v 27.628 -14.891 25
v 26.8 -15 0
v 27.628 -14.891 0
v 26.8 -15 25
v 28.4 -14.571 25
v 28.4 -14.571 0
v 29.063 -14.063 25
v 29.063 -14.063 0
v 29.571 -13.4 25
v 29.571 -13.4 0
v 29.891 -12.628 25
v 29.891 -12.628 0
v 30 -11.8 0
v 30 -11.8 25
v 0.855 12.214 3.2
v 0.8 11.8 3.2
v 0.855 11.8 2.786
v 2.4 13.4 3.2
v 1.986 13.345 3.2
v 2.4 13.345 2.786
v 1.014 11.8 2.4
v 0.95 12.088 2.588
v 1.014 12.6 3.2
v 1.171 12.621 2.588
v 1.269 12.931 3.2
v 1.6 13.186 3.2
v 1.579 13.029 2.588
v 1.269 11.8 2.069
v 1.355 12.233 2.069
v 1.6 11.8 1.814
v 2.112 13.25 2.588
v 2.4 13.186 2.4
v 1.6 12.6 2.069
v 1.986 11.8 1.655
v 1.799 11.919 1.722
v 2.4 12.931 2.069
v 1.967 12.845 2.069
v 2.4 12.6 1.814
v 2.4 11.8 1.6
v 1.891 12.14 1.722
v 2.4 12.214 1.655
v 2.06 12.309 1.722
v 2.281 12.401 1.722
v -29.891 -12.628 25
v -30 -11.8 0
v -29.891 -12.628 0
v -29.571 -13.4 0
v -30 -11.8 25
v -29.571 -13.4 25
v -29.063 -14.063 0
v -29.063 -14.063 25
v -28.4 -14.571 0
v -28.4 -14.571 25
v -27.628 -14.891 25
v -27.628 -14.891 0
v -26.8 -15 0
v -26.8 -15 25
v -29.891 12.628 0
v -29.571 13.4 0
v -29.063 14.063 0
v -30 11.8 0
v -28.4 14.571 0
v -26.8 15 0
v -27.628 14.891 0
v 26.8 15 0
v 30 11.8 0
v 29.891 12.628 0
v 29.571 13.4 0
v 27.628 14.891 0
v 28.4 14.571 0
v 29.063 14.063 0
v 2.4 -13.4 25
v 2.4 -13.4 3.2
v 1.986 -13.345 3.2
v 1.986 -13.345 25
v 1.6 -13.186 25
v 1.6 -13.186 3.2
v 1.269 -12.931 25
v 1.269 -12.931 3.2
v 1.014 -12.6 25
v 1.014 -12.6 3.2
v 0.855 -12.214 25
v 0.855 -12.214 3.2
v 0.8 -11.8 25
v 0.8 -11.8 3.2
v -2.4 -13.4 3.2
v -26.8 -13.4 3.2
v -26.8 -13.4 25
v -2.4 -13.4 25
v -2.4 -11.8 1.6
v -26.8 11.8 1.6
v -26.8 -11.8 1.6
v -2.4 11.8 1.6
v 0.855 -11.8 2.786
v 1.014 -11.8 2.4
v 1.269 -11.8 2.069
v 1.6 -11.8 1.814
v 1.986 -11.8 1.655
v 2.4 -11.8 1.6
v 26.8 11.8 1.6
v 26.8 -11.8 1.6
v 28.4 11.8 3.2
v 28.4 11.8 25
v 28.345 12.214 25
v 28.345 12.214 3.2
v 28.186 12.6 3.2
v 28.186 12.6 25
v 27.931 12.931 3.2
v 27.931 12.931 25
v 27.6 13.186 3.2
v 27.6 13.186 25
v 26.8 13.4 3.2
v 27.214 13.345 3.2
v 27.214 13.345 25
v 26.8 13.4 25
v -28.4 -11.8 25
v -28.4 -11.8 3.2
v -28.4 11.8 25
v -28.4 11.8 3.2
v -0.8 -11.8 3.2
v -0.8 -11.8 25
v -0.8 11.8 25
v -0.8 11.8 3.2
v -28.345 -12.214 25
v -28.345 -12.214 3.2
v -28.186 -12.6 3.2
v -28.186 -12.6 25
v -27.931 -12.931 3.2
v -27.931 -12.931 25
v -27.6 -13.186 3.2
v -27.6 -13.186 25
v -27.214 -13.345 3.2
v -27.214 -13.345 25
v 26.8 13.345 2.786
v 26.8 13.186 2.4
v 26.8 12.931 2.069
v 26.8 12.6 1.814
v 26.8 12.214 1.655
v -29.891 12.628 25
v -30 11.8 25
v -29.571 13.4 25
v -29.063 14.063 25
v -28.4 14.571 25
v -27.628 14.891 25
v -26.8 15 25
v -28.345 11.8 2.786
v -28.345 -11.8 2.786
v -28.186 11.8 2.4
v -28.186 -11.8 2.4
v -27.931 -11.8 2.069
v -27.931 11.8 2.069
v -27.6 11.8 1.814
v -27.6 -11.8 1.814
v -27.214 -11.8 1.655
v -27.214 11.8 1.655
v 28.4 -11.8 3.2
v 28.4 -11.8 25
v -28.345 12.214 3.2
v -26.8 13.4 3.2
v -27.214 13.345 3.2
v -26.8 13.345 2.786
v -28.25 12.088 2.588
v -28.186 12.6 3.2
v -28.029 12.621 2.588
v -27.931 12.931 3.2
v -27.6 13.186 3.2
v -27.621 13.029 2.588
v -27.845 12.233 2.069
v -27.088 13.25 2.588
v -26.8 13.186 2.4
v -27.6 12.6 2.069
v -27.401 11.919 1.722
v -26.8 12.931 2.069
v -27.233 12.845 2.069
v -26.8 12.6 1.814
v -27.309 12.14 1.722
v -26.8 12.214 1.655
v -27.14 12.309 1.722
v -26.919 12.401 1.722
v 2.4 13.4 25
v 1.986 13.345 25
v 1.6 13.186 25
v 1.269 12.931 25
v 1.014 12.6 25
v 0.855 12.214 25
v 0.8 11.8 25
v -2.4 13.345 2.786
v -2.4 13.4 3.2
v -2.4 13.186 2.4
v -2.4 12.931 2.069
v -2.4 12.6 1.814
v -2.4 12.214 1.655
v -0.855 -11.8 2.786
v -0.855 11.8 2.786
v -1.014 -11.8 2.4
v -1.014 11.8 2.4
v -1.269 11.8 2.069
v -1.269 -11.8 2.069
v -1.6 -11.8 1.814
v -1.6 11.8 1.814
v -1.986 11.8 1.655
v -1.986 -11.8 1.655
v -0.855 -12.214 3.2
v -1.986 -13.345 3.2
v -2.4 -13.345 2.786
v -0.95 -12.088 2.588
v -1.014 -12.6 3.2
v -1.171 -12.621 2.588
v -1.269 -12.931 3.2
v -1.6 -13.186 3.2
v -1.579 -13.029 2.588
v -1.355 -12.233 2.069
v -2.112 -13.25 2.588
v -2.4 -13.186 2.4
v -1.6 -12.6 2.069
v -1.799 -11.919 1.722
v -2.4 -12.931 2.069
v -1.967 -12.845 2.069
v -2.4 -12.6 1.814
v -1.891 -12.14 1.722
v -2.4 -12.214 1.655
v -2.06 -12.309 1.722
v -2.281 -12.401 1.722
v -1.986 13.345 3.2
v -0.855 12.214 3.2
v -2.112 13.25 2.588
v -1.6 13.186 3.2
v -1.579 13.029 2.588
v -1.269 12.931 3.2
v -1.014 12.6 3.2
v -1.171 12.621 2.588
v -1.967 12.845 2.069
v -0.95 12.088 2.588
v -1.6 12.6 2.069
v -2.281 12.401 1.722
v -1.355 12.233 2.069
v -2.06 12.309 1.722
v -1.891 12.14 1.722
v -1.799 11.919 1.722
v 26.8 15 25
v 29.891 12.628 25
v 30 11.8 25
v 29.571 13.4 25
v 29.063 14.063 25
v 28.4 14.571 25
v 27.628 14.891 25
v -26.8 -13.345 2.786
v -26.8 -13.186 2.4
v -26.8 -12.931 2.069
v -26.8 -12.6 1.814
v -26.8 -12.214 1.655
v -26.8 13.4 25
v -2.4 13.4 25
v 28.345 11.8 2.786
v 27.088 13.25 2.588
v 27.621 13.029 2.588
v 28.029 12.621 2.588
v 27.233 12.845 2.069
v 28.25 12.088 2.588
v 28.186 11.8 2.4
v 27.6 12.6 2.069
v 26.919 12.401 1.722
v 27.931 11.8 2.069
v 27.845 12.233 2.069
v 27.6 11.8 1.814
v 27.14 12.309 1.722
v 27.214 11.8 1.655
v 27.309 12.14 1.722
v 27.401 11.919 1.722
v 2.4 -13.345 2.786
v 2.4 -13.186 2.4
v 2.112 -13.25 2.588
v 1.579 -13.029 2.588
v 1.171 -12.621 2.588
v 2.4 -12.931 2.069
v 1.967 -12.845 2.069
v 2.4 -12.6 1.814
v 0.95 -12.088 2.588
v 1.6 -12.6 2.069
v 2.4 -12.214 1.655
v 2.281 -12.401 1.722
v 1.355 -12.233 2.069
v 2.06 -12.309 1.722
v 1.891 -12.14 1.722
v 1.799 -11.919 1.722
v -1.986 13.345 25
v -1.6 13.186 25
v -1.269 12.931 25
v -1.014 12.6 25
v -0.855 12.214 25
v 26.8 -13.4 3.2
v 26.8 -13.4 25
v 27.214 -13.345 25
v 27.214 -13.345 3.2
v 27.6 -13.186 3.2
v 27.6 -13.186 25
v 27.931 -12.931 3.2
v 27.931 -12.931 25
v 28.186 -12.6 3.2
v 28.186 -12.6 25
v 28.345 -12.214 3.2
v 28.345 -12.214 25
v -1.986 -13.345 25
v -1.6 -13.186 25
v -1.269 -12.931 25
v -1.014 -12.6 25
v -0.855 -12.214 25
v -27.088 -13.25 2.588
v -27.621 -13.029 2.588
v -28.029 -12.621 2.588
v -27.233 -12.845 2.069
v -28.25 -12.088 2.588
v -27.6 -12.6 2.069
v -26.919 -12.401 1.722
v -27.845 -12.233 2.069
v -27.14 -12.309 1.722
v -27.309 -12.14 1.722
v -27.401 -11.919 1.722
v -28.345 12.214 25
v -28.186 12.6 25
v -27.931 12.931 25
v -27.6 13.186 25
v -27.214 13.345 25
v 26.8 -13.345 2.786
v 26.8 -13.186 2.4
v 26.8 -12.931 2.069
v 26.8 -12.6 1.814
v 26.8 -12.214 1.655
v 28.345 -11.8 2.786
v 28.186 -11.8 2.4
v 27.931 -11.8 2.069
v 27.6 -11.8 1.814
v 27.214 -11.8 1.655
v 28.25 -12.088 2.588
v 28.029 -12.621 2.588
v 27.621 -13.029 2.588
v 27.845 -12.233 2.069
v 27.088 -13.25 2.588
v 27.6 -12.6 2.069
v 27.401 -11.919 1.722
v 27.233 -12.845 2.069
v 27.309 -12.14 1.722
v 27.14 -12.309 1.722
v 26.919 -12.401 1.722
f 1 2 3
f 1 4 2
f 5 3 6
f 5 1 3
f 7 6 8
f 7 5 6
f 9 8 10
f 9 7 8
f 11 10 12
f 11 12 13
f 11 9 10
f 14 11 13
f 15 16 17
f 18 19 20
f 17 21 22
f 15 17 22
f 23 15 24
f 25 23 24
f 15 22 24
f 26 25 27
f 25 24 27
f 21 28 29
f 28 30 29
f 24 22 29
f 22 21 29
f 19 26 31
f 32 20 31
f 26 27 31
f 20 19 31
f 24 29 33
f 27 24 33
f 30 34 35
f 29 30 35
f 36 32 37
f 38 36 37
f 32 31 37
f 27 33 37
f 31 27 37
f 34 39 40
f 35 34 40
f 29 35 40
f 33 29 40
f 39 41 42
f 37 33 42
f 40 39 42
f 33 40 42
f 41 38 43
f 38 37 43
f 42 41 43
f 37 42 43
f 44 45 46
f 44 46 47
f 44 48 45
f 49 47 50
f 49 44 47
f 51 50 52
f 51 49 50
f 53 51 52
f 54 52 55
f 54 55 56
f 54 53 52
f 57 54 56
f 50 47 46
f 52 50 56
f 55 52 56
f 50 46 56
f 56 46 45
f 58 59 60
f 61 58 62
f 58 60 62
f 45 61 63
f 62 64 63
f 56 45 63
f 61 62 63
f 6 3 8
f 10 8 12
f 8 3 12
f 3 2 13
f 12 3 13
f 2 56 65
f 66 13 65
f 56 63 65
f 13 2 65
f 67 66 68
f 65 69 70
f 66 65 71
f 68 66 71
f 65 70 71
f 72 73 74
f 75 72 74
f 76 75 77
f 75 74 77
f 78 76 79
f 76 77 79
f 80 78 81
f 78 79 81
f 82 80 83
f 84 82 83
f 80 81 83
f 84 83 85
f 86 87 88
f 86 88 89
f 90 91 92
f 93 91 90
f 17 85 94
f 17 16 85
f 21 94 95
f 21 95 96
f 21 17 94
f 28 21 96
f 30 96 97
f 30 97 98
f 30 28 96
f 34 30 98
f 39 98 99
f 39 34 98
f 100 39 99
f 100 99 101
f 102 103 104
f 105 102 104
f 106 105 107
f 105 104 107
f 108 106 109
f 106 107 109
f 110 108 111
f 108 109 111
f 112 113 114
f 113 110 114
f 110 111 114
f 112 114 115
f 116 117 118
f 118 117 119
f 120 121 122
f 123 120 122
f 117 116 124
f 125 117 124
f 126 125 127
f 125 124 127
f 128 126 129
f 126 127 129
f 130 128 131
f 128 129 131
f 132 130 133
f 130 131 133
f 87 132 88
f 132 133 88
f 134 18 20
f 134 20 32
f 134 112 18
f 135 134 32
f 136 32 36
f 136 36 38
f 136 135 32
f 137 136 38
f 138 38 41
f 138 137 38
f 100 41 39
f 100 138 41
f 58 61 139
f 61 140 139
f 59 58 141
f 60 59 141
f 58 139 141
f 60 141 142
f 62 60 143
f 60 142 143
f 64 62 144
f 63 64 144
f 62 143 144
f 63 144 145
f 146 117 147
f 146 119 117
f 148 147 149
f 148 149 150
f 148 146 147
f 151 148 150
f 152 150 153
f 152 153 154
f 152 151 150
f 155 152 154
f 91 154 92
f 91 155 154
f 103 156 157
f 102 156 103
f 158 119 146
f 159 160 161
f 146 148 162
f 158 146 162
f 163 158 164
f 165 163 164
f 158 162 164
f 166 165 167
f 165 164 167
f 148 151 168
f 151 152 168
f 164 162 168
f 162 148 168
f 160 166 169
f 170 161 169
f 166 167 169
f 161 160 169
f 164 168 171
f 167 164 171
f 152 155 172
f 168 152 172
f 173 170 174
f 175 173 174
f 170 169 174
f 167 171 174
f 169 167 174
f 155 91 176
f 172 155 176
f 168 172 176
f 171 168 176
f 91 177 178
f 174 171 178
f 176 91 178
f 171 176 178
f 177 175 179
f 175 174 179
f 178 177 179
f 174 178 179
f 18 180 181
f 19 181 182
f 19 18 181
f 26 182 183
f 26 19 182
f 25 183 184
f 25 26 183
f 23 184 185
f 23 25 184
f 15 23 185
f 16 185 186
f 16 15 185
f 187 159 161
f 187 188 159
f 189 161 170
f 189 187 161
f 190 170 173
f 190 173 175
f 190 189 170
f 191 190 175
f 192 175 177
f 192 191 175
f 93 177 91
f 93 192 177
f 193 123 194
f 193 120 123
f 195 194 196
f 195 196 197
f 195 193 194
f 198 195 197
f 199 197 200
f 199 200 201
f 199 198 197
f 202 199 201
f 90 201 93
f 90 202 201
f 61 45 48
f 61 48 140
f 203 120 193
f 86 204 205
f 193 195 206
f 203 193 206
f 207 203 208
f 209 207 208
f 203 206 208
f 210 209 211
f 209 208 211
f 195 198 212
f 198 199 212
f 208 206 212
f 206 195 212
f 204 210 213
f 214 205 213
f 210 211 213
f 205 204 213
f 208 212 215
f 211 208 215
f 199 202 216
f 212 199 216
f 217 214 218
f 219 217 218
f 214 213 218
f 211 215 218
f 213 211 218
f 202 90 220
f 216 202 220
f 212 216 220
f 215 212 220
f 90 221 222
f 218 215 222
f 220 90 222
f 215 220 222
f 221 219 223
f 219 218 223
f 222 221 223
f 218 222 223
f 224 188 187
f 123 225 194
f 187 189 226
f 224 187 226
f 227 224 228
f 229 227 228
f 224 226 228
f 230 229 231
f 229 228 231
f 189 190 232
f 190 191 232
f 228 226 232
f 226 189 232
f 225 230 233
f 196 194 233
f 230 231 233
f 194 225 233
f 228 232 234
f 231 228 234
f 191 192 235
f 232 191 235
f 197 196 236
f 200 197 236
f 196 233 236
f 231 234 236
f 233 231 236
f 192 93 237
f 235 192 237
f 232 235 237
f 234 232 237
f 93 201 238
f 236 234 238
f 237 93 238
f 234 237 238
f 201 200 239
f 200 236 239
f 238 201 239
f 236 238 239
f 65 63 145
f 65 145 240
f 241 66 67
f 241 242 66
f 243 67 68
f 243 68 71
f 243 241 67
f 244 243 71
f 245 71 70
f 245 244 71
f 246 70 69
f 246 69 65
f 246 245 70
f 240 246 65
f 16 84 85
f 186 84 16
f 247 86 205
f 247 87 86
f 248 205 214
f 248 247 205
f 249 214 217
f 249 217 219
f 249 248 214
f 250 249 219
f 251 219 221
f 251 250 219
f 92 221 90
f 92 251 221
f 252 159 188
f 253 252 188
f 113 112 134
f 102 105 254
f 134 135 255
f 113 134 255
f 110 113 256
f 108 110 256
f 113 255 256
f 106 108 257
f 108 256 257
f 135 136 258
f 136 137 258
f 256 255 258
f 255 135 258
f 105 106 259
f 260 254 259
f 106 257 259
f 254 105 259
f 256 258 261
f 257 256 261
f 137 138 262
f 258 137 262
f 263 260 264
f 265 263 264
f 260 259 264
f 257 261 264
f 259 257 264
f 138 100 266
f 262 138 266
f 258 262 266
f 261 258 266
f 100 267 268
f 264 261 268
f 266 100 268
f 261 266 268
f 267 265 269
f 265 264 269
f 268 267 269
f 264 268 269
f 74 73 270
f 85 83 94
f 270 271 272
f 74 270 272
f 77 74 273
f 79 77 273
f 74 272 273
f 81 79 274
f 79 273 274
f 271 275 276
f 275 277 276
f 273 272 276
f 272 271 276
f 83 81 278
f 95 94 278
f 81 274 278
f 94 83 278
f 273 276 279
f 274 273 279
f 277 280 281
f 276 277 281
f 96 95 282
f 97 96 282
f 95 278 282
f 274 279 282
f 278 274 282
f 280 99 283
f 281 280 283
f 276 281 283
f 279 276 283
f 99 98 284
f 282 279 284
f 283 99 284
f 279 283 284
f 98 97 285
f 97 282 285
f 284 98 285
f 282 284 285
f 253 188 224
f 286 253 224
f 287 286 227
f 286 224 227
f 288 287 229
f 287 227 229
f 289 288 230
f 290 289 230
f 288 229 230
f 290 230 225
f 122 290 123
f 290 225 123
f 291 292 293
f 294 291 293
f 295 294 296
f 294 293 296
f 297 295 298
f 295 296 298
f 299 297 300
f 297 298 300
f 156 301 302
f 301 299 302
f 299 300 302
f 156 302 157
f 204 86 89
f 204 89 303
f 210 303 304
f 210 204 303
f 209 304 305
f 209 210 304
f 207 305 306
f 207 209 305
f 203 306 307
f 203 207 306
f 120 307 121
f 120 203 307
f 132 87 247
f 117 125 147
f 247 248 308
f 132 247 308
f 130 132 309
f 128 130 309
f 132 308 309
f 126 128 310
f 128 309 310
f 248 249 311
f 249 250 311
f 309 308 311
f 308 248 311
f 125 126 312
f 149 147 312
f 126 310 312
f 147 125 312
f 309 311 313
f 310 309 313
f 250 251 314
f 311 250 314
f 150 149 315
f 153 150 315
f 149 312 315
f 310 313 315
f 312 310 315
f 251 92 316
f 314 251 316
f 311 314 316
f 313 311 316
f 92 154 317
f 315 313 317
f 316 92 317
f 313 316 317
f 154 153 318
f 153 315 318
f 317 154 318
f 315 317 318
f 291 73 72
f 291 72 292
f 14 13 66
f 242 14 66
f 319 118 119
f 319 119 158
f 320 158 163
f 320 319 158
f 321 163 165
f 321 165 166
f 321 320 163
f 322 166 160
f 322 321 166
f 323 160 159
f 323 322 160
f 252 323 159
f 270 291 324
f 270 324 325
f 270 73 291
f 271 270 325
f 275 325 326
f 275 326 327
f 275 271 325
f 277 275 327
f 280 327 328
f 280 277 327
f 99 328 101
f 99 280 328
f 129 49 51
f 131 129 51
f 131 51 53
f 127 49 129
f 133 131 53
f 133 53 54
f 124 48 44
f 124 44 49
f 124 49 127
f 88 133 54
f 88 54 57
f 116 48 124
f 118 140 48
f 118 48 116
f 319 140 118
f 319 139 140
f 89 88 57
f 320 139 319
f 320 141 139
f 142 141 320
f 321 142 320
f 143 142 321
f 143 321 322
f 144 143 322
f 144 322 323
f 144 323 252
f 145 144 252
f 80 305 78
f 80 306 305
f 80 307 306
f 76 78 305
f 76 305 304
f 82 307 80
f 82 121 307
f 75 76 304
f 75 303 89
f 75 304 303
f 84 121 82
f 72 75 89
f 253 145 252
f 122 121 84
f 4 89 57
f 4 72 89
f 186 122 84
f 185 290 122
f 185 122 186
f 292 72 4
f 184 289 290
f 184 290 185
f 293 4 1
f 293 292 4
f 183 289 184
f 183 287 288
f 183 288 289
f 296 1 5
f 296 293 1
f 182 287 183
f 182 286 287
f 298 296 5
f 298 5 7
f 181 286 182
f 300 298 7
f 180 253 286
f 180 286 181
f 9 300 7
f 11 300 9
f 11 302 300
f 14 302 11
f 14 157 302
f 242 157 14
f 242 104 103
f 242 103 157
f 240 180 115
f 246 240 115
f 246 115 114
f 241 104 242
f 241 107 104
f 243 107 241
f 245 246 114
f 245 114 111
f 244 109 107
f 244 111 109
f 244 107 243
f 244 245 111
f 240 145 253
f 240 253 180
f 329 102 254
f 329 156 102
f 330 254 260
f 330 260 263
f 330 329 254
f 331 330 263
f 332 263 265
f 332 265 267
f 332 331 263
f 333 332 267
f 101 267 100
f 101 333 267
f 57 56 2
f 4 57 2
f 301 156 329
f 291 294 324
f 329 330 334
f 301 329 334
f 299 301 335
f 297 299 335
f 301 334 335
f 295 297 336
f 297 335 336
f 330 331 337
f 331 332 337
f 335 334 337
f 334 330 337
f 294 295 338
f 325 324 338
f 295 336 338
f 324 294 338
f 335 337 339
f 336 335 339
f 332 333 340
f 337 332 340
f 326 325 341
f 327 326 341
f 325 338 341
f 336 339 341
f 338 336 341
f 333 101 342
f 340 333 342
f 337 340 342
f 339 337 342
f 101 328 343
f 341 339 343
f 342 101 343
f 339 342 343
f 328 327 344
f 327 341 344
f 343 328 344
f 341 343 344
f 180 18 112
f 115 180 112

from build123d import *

# Parameters (mm, degrees)
F0_W     = 60
F0_H     = 30
F1_DEPTH = 25
F2_R     = 3.2
F3_T     = -1.6
F4_W     = 1.6
F4_H     = 26.8
F5_DEPTH = 23.4
F6_R     = 1.6
F7_R     = 1.6


with BuildPart() as f1:
    # F0 (on Top) → F1 (new body)
    with BuildSketch(Plane.XY):
        Rectangle(F0_W, F0_H)
    extrude(amount=F1_DEPTH)

    # F2
    f2_edges = [f1.edges().sort_by_distance(p)[0] for p in [
        (-30, 15, 12.5),
        (-30, -15, 12.5),
        (30, -15, 12.5),
        (30, 15, 12.5),
    ]]
    fillet(f2_edges, radius=F2_R)

    # F3
    f3_openings = [f1.faces().sort_by_distance(p)[0] for p in [
        (0, 0, 25),
    ]]
    offset(amount=F3_T, openings=f3_openings)

    # F4 (on face) → F5 (join, through all)
    with BuildSketch(Plane.XY.offset(25)):
        Rectangle(F4_W, F4_H)
    extrude(amount=-F5_DEPTH)

    # F6
    f6_edges = [f1.edges().sort_by_distance(p)[0] for p in [
        (-0.8, 13.4, 13.3),
        (0.8, 13.4, 13.3),
        (-0.8, -13.4, 13.3),
        (0.8, -13.4, 13.3),
    ]]
    fillet(f6_edges, radius=F6_R)

    # F7
    f7_edges = [f1.edges().sort_by_distance(p)[0] for p in [
        (-14.6, 13.4, 1.6),
        (14.6, 13.4, 1.6),
    ]]
    fillet(f7_edges, radius=F7_R)


solid = f1.part
